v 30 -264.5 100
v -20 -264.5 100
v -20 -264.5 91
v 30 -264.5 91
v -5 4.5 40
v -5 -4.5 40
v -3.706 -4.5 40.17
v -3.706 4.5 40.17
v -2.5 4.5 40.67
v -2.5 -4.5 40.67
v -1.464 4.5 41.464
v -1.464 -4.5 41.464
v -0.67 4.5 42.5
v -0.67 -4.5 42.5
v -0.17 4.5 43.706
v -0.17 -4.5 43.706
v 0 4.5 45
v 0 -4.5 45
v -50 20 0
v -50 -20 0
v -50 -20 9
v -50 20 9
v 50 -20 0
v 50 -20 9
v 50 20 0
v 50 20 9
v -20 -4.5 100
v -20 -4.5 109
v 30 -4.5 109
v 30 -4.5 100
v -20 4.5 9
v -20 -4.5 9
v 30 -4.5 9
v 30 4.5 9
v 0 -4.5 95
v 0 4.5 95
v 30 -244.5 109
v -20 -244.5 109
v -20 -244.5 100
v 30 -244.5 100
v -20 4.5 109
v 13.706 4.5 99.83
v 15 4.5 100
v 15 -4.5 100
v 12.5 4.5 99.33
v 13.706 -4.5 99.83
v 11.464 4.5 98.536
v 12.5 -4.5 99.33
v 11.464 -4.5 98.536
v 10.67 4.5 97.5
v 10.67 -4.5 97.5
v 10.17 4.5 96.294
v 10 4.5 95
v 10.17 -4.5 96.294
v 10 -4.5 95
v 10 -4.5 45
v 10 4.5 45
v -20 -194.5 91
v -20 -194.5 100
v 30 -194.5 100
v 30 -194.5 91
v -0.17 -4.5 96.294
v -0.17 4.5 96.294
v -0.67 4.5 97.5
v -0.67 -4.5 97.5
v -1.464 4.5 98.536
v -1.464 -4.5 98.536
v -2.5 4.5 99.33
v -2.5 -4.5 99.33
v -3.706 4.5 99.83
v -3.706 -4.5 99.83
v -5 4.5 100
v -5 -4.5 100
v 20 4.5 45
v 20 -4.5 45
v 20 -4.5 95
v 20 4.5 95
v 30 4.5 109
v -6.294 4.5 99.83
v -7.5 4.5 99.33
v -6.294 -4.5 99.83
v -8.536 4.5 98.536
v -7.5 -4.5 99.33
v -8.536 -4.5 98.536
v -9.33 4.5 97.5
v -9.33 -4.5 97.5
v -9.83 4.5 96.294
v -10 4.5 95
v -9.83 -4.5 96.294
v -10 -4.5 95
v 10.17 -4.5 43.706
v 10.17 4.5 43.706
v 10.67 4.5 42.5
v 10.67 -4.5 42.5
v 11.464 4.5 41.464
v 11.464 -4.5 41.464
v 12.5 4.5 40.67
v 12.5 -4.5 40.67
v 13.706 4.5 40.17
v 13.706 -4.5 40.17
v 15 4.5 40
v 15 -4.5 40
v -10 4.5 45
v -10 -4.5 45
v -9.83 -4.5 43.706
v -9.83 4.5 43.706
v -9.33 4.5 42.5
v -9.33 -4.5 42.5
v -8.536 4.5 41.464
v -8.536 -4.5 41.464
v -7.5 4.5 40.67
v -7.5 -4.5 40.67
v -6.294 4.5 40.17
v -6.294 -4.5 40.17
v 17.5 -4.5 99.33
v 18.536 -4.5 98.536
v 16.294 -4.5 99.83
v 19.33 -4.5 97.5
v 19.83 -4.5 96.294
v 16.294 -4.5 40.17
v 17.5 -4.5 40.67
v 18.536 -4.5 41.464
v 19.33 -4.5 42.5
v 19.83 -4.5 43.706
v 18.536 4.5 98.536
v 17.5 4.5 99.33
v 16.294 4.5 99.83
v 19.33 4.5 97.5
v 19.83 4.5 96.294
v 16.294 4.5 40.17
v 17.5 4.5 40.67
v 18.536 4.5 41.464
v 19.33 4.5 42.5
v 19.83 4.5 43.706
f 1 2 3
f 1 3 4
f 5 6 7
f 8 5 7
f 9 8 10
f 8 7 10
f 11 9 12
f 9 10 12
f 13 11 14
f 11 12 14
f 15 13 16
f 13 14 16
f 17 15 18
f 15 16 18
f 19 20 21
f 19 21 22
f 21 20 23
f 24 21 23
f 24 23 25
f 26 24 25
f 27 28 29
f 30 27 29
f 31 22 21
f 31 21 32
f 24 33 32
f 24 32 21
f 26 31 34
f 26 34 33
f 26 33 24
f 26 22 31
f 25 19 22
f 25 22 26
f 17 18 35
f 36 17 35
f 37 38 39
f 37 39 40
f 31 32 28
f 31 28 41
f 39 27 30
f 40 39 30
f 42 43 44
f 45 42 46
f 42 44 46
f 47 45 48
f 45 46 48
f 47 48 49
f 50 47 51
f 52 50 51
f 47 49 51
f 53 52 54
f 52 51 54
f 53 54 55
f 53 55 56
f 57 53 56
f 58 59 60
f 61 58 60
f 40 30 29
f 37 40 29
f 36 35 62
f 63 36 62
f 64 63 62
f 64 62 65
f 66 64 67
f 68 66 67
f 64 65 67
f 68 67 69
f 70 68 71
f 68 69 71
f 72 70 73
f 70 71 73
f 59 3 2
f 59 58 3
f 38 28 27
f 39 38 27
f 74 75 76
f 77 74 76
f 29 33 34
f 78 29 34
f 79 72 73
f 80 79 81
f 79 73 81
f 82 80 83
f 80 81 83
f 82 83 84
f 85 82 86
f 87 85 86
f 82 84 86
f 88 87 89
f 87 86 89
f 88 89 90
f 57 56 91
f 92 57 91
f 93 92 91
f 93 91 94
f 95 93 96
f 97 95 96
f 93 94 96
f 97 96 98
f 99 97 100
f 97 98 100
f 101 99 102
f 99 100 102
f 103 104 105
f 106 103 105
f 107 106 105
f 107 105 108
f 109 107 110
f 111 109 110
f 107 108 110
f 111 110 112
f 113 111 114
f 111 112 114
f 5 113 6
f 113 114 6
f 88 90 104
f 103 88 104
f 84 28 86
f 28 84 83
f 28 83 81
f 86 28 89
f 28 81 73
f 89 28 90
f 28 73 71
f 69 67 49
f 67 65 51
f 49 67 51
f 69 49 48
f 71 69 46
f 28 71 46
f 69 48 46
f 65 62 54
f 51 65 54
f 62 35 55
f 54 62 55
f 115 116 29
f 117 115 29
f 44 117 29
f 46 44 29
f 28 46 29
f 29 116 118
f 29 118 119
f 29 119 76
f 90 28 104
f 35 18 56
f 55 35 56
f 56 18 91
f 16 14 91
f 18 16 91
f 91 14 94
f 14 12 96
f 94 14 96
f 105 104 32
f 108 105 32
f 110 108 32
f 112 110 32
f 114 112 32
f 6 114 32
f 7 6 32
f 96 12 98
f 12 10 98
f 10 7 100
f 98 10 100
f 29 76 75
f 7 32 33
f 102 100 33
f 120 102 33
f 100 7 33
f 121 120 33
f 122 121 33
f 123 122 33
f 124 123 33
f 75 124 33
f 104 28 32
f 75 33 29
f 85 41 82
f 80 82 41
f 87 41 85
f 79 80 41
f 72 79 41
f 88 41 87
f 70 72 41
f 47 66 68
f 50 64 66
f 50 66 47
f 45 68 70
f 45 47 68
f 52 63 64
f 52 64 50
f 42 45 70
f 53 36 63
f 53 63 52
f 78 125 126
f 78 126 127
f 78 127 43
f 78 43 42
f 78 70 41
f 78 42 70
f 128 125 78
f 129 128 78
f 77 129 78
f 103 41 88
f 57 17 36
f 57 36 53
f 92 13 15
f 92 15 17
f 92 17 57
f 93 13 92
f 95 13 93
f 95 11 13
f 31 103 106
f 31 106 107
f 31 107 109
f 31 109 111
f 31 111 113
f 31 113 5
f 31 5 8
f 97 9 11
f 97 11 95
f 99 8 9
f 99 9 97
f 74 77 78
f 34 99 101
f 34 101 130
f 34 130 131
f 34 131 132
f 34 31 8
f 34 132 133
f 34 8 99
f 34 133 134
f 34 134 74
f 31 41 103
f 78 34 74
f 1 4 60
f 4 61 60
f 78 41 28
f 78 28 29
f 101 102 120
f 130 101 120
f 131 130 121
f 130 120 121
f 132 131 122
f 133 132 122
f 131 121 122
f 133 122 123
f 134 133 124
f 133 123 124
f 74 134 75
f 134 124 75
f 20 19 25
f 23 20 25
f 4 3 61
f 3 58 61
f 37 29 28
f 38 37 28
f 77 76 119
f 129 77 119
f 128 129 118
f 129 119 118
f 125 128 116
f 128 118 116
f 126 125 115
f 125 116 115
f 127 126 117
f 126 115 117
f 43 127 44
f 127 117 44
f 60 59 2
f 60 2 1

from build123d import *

# Parameters (mm, degrees)
F0_W      = 100
F0_H      = 40
F1_DEPTH  = 9
F2_W      = 50
F2_H      = 9
F3_DEPTH  = 100
F5_DEPTH  = 18
F7_DEPTH  = 240
F8_W      = 50
F8_H      = 50
F9_DEPTH  = 9
F10_W     = 50
F10_H     = 9
F11_DEPTH = 20


with BuildPart() as f1:
    # F0 (on Top) → F1 (new body)
    with BuildSketch(Plane.XY):
        Rectangle(F0_W, F0_H)
    extrude(amount=F1_DEPTH)

    # F2 (on face) → F3 (join)
    with BuildSketch(Plane.XY.offset(9)):
        with Locations((5, 0)):
            Rectangle(F2_W, F2_H)
    extrude(amount=F3_DEPTH)

    # F4 (on face) → F5 (cut)
    with BuildSketch(Plane.XZ.offset(4.5)):
        with BuildLine():
            ThreePointArc((-5, 100), (-8.5355339059, 98.5355339059), (-10, 95))
            Line((-10, 95), (-10, 45))
            ThreePointArc((-10, 45), (-8.5355339059, 41.4644660941), (-5, 40))
            ThreePointArc((-5, 40), (-1.4644660941, 41.4644660941), (0, 45))
            Line((0, 45), (0, 95))
            ThreePointArc((0, 95), (-1.4644660941, 98.5355339059), (-5, 100))
        make_face()
        with BuildLine():
            ThreePointArc((15, 100), (11.4644660941, 98.5355339059), (10, 95))
            Line((10, 95), (10, 45))
            ThreePointArc((10, 45), (11.4644660941, 41.4644660941), (15, 40))
            ThreePointArc((15, 40), (18.5355339059, 41.4644660941), (20, 45))
            Line((20, 45), (20, 95))
            ThreePointArc((20, 95), (18.5355339059, 98.5355339059), (15, 100))
        make_face()
    extrude(amount=-F5_DEPTH, mode=Mode.SUBTRACT)


with BuildPart() as f7:
    # F6 (on face) → F7 (new body)
    with BuildSketch(Plane.XZ.offset(4.5)):
        Polygon((30, 100), (30, 109), (-20, 109), (-20, 100), (-5.0000000643, 100), (15, 100), align=None)
    extrude(amount=F7_DEPTH)


with BuildPart() as f9:
    # F8 (on face) → F9 (new body)
    with BuildSketch(Plane(origin=(0, 0, 100), x_dir=(1, 0, 0), z_dir=(0, 0, -1))):
        with Locations((5, 219.5)):
            Rectangle(F8_W, F8_H)
    extrude(amount=F9_DEPTH)

    # F10 (on face) → F11 (join)
    with BuildSketch(Plane.XZ.offset(244.5)):
        with Locations((5, 95.5)):
            Rectangle(F10_W, F10_H)
    extrude(amount=F11_DEPTH)


solid = Compound([f1.part, f7.part, f9.part])
